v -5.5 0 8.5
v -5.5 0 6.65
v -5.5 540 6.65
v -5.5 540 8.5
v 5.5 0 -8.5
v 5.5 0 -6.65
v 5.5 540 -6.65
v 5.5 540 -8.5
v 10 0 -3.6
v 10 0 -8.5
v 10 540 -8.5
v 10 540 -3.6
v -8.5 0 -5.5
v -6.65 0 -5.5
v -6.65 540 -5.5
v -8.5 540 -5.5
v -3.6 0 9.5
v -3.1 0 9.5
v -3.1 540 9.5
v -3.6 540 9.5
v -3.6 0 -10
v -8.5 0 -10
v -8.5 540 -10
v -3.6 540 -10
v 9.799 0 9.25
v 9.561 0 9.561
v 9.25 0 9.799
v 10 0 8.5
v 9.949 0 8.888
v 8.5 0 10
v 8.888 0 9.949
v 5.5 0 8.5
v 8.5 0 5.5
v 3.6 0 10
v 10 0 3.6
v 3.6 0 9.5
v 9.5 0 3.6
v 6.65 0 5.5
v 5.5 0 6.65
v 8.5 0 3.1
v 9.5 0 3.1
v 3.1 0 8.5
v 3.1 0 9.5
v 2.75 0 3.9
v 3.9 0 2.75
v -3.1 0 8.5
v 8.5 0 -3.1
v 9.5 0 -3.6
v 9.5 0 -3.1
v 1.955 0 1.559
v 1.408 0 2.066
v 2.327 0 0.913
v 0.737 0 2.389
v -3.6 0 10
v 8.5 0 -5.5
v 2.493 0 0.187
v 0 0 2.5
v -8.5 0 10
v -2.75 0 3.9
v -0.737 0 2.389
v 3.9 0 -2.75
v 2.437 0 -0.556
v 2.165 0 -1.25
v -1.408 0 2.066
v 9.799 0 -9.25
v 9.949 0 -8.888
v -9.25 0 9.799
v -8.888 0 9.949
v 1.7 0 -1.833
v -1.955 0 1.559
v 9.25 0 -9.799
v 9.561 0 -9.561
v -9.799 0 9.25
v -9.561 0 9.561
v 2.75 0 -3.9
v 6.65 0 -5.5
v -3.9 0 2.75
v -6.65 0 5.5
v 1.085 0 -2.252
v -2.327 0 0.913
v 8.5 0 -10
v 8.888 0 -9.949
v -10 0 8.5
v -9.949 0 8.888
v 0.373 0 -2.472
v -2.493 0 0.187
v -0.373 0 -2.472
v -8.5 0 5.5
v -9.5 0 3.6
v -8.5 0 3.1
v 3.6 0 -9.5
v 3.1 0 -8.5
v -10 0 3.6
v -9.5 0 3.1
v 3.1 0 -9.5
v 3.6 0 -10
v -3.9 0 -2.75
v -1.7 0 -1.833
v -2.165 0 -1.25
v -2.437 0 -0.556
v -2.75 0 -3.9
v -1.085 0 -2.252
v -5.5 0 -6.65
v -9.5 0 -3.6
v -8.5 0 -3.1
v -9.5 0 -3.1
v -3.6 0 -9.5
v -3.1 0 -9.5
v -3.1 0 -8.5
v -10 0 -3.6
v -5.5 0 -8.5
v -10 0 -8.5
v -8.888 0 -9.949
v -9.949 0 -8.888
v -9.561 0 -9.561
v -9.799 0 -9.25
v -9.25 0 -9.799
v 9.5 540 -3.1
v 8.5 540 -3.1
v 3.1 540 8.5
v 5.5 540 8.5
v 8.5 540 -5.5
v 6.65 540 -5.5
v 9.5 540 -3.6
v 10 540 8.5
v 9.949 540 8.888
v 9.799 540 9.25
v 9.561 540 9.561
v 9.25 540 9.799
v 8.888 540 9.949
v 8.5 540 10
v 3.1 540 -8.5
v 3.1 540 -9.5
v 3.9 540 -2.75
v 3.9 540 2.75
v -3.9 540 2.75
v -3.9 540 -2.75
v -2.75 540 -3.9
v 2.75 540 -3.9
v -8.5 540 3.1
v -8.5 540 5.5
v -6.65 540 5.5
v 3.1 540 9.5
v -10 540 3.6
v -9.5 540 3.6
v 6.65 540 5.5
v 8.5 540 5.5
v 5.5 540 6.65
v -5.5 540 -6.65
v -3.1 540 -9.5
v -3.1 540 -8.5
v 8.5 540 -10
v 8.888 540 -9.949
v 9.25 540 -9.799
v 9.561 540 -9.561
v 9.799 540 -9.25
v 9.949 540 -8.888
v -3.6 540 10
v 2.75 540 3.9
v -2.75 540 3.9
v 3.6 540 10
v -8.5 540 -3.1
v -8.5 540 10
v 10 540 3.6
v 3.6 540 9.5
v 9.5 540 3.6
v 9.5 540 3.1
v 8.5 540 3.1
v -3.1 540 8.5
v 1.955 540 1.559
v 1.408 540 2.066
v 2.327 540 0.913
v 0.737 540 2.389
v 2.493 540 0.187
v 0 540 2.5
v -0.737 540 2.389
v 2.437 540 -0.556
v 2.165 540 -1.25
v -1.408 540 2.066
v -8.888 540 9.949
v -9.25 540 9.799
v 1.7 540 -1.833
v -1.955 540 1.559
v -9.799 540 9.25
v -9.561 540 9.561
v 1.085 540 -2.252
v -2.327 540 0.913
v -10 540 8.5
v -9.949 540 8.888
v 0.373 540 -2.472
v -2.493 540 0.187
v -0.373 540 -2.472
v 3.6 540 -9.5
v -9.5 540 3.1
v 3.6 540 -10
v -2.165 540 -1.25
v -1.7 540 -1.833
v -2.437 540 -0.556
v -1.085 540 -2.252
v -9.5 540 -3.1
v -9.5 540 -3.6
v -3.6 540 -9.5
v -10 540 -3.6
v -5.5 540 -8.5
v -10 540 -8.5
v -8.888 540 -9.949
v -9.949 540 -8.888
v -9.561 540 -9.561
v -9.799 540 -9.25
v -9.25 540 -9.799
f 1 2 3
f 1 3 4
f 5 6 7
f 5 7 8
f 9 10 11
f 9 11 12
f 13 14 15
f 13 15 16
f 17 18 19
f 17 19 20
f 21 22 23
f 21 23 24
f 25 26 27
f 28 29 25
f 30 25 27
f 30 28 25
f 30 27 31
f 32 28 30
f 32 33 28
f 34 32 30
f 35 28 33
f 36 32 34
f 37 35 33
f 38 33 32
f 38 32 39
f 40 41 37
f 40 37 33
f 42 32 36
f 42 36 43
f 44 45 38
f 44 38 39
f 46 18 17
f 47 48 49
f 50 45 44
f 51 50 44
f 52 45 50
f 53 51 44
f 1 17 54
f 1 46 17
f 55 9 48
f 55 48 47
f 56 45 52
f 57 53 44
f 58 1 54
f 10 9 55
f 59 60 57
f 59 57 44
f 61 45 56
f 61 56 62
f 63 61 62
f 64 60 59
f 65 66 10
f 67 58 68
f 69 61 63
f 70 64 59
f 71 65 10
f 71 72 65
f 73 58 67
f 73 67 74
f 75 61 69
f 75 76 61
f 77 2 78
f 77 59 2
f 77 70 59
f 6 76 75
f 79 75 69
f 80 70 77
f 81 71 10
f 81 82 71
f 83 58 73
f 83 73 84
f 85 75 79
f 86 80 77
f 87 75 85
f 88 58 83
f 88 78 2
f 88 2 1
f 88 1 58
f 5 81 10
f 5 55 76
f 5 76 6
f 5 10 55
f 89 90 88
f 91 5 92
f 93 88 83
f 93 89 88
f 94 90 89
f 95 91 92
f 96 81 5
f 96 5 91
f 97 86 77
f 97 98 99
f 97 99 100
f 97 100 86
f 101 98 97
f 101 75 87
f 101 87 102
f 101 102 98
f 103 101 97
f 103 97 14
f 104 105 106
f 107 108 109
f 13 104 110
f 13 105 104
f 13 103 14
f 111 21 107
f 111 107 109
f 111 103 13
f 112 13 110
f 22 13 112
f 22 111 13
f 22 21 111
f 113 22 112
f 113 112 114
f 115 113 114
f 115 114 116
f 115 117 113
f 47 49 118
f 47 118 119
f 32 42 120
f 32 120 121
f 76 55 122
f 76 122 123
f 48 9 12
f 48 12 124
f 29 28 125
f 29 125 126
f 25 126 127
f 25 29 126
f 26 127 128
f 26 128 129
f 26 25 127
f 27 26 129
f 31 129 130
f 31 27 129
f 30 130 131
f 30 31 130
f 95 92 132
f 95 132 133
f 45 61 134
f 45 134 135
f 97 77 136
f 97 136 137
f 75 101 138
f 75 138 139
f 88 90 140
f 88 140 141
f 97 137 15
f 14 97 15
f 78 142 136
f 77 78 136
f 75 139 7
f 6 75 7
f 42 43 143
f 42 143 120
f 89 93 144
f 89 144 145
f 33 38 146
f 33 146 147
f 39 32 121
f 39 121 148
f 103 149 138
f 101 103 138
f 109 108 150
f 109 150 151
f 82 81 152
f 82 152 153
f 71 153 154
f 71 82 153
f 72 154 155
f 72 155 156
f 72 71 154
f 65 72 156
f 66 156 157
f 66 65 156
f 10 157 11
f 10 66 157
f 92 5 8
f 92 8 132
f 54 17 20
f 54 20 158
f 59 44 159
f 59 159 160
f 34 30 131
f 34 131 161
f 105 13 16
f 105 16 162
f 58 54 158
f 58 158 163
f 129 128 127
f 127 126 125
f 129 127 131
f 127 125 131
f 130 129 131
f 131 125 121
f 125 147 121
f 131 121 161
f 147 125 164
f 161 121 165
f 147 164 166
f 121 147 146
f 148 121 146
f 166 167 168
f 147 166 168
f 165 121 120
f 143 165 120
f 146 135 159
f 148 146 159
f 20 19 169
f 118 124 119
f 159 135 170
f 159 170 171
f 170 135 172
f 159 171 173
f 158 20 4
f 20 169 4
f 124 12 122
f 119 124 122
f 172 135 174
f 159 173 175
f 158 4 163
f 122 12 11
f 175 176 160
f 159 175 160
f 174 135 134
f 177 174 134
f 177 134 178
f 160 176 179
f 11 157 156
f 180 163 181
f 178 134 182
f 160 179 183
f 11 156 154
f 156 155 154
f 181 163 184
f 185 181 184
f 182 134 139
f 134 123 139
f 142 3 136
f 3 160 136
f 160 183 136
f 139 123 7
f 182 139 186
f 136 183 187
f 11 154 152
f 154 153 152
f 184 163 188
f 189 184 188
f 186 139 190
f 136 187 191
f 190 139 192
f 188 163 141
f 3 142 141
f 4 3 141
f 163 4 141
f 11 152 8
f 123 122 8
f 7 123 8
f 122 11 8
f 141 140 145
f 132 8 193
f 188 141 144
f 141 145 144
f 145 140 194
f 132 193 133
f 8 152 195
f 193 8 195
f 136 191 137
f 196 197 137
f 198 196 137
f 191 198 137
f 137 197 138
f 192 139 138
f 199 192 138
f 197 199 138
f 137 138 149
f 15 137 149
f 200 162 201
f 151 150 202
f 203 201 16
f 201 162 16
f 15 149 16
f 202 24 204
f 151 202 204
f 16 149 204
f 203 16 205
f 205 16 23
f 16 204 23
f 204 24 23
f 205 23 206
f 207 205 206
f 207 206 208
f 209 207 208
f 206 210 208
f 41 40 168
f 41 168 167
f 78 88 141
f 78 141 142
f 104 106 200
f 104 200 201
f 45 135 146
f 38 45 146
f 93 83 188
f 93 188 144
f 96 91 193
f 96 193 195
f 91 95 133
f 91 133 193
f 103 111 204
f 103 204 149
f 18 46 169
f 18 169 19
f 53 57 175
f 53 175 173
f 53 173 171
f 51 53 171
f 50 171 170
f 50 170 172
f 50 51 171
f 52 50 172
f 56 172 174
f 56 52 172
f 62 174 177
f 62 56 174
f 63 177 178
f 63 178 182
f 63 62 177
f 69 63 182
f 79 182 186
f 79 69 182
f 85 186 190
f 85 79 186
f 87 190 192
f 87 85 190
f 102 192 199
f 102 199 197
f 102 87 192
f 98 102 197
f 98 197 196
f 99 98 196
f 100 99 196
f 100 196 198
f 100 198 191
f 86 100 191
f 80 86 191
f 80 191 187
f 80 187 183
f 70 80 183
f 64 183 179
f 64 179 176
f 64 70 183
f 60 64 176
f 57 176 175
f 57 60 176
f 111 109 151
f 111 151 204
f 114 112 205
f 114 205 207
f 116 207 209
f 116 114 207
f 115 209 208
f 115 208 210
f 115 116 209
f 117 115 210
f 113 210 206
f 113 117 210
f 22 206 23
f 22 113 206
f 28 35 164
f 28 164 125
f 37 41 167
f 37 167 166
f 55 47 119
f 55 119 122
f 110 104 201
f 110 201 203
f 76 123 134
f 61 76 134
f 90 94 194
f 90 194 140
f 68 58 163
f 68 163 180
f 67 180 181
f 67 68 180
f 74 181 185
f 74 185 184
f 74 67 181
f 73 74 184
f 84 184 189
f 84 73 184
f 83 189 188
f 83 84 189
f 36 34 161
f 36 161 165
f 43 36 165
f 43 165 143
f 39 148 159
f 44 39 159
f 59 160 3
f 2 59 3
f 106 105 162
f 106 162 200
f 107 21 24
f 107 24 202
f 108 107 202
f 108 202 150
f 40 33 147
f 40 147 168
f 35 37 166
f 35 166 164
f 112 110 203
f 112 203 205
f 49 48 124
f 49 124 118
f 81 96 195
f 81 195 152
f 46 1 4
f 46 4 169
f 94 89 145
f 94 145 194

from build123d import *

# Parameters (mm, degrees)
SKETCH_2_R      = 2.5
EXTRUDE_1_DEPTH = 540


with BuildPart() as part:
    # 草图2 → 凸台-拉伸1 (new body)
    with BuildSketch(Plane(origin=(0, 0, 0), x_dir=(1, 0, 0), z_dir=(0, 1, 0))):
        with BuildLine():
            Line((-3.6, 10), (-3.6, 9.5))
            Line((-3.6, 9.5), (-3.1, 9.5))
            Line((-3.1, 9.5), (-3.1, 8.5))
            Line((-3.1, 8.5), (-5.5, 8.5))
            Line((-5.5, 8.5), (-5.5, 6.65))
            Line((-5.5, 6.65), (-2.75, 3.9))
            Line((-2.75, 3.9), (2.75, 3.9))
            Line((2.75, 3.9), (5.5, 6.65))
            Line((5.5, 6.65), (5.5, 8.5))
            Line((5.5, 8.5), (3.1, 8.5))
            Line((3.1, 8.5), (3.1, 9.5))
            Line((3.1, 9.5), (3.6, 9.5))
            Line((3.6, 9.5), (3.6, 10))
            Line((3.6, 10), (8.5, 10))
            ThreePointArc((8.5, 10), (9.560660172, 9.560660172), (10, 8.5))
            Line((10, 8.5), (10, 3.6))
            Line((10, 3.6), (9.5, 3.6))
            Line((9.5, 3.6), (9.5, 3.1))
            Line((9.5, 3.1), (8.5, 3.1))
            Line((8.5, 3.1), (8.5, 5.5))
            Line((8.5, 5.5), (6.65, 5.5))
            Line((6.65, 5.5), (3.9, 2.75))
            Line((3.9, 2.75), (3.9, -2.75))
            Line((3.9, -2.75), (6.65, -5.5))
            Line((6.65, -5.5), (8.5, -5.5))
            Line((8.5, -5.5), (8.5, -3.1))
            Line((8.5, -3.1), (9.5, -3.1))
            Line((9.5, -3.1), (9.5, -3.6))
            Line((9.5, -3.6), (10, -3.6))
            Line((10, -3.6), (10, -8.5))
            ThreePointArc((10, -8.5), (9.560660172, -9.560660172), (8.5, -10))
            Line((8.5, -10), (3.6, -10))
            Line((3.6, -10), (3.6, -9.5))
            Line((3.6, -9.5), (3.1, -9.5))
            Line((3.1, -9.5), (3.1, -8.5))
            Line((3.1, -8.5), (5.5, -8.5))
            Line((5.5, -8.5), (5.5, -6.65))
            Line((5.5, -6.65), (2.75, -3.9))
            Line((2.75, -3.9), (-2.75, -3.9))
            Line((-2.75, -3.9), (-5.5, -6.65))
            Line((-5.5, -6.65), (-5.5, -8.5))
            Line((-5.5, -8.5), (-3.1, -8.5))
            Line((-3.1, -8.5), (-3.1, -9.5))
            Line((-3.1, -9.5), (-3.6, -9.5))
            Line((-3.6, -9.5), (-3.6, -10))
            Line((-3.6, -10), (-8.5, -10))
            ThreePointArc((-8.5, -10), (-9.560660172, -9.560660172), (-10, -8.5))
            Line((-10, -8.5), (-10, -3.6))
            Line((-10, -3.6), (-9.5, -3.6))
            Line((-9.5, -3.6), (-9.5, -3.1))
            Line((-9.5, -3.1), (-8.5, -3.1))
            Line((-8.5, -3.1), (-8.5, -5.5))
            Line((-8.5, -5.5), (-6.65, -5.5))
            Line((-6.65, -5.5), (-3.9, -2.75))
            Line((-3.9, -2.75), (-3.9, 2.75))
            Line((-3.9, 2.75), (-6.65, 5.5))
            Line((-6.65, 5.5), (-8.5, 5.5))
            Line((-8.5, 5.5), (-8.5, 3.1))
            Line((-8.5, 3.1), (-9.5, 3.1))
            Line((-9.5, 3.1), (-9.5, 3.6))
            Line((-9.5, 3.6), (-10, 3.6))
            Line((-10, 3.6), (-10, 8.5))
            ThreePointArc((-10, 8.5), (-9.560660172, 9.560660172), (-8.5, 10))
            Line((-8.5, 10), (-3.6, 10))
        make_face()
        with Locations(Location((0, 0, 0), (0, 0, 270))):
            Circle(SKETCH_2_R, mode=Mode.SUBTRACT)
    extrude(amount=EXTRUDE_1_DEPTH)


solid = part.part
